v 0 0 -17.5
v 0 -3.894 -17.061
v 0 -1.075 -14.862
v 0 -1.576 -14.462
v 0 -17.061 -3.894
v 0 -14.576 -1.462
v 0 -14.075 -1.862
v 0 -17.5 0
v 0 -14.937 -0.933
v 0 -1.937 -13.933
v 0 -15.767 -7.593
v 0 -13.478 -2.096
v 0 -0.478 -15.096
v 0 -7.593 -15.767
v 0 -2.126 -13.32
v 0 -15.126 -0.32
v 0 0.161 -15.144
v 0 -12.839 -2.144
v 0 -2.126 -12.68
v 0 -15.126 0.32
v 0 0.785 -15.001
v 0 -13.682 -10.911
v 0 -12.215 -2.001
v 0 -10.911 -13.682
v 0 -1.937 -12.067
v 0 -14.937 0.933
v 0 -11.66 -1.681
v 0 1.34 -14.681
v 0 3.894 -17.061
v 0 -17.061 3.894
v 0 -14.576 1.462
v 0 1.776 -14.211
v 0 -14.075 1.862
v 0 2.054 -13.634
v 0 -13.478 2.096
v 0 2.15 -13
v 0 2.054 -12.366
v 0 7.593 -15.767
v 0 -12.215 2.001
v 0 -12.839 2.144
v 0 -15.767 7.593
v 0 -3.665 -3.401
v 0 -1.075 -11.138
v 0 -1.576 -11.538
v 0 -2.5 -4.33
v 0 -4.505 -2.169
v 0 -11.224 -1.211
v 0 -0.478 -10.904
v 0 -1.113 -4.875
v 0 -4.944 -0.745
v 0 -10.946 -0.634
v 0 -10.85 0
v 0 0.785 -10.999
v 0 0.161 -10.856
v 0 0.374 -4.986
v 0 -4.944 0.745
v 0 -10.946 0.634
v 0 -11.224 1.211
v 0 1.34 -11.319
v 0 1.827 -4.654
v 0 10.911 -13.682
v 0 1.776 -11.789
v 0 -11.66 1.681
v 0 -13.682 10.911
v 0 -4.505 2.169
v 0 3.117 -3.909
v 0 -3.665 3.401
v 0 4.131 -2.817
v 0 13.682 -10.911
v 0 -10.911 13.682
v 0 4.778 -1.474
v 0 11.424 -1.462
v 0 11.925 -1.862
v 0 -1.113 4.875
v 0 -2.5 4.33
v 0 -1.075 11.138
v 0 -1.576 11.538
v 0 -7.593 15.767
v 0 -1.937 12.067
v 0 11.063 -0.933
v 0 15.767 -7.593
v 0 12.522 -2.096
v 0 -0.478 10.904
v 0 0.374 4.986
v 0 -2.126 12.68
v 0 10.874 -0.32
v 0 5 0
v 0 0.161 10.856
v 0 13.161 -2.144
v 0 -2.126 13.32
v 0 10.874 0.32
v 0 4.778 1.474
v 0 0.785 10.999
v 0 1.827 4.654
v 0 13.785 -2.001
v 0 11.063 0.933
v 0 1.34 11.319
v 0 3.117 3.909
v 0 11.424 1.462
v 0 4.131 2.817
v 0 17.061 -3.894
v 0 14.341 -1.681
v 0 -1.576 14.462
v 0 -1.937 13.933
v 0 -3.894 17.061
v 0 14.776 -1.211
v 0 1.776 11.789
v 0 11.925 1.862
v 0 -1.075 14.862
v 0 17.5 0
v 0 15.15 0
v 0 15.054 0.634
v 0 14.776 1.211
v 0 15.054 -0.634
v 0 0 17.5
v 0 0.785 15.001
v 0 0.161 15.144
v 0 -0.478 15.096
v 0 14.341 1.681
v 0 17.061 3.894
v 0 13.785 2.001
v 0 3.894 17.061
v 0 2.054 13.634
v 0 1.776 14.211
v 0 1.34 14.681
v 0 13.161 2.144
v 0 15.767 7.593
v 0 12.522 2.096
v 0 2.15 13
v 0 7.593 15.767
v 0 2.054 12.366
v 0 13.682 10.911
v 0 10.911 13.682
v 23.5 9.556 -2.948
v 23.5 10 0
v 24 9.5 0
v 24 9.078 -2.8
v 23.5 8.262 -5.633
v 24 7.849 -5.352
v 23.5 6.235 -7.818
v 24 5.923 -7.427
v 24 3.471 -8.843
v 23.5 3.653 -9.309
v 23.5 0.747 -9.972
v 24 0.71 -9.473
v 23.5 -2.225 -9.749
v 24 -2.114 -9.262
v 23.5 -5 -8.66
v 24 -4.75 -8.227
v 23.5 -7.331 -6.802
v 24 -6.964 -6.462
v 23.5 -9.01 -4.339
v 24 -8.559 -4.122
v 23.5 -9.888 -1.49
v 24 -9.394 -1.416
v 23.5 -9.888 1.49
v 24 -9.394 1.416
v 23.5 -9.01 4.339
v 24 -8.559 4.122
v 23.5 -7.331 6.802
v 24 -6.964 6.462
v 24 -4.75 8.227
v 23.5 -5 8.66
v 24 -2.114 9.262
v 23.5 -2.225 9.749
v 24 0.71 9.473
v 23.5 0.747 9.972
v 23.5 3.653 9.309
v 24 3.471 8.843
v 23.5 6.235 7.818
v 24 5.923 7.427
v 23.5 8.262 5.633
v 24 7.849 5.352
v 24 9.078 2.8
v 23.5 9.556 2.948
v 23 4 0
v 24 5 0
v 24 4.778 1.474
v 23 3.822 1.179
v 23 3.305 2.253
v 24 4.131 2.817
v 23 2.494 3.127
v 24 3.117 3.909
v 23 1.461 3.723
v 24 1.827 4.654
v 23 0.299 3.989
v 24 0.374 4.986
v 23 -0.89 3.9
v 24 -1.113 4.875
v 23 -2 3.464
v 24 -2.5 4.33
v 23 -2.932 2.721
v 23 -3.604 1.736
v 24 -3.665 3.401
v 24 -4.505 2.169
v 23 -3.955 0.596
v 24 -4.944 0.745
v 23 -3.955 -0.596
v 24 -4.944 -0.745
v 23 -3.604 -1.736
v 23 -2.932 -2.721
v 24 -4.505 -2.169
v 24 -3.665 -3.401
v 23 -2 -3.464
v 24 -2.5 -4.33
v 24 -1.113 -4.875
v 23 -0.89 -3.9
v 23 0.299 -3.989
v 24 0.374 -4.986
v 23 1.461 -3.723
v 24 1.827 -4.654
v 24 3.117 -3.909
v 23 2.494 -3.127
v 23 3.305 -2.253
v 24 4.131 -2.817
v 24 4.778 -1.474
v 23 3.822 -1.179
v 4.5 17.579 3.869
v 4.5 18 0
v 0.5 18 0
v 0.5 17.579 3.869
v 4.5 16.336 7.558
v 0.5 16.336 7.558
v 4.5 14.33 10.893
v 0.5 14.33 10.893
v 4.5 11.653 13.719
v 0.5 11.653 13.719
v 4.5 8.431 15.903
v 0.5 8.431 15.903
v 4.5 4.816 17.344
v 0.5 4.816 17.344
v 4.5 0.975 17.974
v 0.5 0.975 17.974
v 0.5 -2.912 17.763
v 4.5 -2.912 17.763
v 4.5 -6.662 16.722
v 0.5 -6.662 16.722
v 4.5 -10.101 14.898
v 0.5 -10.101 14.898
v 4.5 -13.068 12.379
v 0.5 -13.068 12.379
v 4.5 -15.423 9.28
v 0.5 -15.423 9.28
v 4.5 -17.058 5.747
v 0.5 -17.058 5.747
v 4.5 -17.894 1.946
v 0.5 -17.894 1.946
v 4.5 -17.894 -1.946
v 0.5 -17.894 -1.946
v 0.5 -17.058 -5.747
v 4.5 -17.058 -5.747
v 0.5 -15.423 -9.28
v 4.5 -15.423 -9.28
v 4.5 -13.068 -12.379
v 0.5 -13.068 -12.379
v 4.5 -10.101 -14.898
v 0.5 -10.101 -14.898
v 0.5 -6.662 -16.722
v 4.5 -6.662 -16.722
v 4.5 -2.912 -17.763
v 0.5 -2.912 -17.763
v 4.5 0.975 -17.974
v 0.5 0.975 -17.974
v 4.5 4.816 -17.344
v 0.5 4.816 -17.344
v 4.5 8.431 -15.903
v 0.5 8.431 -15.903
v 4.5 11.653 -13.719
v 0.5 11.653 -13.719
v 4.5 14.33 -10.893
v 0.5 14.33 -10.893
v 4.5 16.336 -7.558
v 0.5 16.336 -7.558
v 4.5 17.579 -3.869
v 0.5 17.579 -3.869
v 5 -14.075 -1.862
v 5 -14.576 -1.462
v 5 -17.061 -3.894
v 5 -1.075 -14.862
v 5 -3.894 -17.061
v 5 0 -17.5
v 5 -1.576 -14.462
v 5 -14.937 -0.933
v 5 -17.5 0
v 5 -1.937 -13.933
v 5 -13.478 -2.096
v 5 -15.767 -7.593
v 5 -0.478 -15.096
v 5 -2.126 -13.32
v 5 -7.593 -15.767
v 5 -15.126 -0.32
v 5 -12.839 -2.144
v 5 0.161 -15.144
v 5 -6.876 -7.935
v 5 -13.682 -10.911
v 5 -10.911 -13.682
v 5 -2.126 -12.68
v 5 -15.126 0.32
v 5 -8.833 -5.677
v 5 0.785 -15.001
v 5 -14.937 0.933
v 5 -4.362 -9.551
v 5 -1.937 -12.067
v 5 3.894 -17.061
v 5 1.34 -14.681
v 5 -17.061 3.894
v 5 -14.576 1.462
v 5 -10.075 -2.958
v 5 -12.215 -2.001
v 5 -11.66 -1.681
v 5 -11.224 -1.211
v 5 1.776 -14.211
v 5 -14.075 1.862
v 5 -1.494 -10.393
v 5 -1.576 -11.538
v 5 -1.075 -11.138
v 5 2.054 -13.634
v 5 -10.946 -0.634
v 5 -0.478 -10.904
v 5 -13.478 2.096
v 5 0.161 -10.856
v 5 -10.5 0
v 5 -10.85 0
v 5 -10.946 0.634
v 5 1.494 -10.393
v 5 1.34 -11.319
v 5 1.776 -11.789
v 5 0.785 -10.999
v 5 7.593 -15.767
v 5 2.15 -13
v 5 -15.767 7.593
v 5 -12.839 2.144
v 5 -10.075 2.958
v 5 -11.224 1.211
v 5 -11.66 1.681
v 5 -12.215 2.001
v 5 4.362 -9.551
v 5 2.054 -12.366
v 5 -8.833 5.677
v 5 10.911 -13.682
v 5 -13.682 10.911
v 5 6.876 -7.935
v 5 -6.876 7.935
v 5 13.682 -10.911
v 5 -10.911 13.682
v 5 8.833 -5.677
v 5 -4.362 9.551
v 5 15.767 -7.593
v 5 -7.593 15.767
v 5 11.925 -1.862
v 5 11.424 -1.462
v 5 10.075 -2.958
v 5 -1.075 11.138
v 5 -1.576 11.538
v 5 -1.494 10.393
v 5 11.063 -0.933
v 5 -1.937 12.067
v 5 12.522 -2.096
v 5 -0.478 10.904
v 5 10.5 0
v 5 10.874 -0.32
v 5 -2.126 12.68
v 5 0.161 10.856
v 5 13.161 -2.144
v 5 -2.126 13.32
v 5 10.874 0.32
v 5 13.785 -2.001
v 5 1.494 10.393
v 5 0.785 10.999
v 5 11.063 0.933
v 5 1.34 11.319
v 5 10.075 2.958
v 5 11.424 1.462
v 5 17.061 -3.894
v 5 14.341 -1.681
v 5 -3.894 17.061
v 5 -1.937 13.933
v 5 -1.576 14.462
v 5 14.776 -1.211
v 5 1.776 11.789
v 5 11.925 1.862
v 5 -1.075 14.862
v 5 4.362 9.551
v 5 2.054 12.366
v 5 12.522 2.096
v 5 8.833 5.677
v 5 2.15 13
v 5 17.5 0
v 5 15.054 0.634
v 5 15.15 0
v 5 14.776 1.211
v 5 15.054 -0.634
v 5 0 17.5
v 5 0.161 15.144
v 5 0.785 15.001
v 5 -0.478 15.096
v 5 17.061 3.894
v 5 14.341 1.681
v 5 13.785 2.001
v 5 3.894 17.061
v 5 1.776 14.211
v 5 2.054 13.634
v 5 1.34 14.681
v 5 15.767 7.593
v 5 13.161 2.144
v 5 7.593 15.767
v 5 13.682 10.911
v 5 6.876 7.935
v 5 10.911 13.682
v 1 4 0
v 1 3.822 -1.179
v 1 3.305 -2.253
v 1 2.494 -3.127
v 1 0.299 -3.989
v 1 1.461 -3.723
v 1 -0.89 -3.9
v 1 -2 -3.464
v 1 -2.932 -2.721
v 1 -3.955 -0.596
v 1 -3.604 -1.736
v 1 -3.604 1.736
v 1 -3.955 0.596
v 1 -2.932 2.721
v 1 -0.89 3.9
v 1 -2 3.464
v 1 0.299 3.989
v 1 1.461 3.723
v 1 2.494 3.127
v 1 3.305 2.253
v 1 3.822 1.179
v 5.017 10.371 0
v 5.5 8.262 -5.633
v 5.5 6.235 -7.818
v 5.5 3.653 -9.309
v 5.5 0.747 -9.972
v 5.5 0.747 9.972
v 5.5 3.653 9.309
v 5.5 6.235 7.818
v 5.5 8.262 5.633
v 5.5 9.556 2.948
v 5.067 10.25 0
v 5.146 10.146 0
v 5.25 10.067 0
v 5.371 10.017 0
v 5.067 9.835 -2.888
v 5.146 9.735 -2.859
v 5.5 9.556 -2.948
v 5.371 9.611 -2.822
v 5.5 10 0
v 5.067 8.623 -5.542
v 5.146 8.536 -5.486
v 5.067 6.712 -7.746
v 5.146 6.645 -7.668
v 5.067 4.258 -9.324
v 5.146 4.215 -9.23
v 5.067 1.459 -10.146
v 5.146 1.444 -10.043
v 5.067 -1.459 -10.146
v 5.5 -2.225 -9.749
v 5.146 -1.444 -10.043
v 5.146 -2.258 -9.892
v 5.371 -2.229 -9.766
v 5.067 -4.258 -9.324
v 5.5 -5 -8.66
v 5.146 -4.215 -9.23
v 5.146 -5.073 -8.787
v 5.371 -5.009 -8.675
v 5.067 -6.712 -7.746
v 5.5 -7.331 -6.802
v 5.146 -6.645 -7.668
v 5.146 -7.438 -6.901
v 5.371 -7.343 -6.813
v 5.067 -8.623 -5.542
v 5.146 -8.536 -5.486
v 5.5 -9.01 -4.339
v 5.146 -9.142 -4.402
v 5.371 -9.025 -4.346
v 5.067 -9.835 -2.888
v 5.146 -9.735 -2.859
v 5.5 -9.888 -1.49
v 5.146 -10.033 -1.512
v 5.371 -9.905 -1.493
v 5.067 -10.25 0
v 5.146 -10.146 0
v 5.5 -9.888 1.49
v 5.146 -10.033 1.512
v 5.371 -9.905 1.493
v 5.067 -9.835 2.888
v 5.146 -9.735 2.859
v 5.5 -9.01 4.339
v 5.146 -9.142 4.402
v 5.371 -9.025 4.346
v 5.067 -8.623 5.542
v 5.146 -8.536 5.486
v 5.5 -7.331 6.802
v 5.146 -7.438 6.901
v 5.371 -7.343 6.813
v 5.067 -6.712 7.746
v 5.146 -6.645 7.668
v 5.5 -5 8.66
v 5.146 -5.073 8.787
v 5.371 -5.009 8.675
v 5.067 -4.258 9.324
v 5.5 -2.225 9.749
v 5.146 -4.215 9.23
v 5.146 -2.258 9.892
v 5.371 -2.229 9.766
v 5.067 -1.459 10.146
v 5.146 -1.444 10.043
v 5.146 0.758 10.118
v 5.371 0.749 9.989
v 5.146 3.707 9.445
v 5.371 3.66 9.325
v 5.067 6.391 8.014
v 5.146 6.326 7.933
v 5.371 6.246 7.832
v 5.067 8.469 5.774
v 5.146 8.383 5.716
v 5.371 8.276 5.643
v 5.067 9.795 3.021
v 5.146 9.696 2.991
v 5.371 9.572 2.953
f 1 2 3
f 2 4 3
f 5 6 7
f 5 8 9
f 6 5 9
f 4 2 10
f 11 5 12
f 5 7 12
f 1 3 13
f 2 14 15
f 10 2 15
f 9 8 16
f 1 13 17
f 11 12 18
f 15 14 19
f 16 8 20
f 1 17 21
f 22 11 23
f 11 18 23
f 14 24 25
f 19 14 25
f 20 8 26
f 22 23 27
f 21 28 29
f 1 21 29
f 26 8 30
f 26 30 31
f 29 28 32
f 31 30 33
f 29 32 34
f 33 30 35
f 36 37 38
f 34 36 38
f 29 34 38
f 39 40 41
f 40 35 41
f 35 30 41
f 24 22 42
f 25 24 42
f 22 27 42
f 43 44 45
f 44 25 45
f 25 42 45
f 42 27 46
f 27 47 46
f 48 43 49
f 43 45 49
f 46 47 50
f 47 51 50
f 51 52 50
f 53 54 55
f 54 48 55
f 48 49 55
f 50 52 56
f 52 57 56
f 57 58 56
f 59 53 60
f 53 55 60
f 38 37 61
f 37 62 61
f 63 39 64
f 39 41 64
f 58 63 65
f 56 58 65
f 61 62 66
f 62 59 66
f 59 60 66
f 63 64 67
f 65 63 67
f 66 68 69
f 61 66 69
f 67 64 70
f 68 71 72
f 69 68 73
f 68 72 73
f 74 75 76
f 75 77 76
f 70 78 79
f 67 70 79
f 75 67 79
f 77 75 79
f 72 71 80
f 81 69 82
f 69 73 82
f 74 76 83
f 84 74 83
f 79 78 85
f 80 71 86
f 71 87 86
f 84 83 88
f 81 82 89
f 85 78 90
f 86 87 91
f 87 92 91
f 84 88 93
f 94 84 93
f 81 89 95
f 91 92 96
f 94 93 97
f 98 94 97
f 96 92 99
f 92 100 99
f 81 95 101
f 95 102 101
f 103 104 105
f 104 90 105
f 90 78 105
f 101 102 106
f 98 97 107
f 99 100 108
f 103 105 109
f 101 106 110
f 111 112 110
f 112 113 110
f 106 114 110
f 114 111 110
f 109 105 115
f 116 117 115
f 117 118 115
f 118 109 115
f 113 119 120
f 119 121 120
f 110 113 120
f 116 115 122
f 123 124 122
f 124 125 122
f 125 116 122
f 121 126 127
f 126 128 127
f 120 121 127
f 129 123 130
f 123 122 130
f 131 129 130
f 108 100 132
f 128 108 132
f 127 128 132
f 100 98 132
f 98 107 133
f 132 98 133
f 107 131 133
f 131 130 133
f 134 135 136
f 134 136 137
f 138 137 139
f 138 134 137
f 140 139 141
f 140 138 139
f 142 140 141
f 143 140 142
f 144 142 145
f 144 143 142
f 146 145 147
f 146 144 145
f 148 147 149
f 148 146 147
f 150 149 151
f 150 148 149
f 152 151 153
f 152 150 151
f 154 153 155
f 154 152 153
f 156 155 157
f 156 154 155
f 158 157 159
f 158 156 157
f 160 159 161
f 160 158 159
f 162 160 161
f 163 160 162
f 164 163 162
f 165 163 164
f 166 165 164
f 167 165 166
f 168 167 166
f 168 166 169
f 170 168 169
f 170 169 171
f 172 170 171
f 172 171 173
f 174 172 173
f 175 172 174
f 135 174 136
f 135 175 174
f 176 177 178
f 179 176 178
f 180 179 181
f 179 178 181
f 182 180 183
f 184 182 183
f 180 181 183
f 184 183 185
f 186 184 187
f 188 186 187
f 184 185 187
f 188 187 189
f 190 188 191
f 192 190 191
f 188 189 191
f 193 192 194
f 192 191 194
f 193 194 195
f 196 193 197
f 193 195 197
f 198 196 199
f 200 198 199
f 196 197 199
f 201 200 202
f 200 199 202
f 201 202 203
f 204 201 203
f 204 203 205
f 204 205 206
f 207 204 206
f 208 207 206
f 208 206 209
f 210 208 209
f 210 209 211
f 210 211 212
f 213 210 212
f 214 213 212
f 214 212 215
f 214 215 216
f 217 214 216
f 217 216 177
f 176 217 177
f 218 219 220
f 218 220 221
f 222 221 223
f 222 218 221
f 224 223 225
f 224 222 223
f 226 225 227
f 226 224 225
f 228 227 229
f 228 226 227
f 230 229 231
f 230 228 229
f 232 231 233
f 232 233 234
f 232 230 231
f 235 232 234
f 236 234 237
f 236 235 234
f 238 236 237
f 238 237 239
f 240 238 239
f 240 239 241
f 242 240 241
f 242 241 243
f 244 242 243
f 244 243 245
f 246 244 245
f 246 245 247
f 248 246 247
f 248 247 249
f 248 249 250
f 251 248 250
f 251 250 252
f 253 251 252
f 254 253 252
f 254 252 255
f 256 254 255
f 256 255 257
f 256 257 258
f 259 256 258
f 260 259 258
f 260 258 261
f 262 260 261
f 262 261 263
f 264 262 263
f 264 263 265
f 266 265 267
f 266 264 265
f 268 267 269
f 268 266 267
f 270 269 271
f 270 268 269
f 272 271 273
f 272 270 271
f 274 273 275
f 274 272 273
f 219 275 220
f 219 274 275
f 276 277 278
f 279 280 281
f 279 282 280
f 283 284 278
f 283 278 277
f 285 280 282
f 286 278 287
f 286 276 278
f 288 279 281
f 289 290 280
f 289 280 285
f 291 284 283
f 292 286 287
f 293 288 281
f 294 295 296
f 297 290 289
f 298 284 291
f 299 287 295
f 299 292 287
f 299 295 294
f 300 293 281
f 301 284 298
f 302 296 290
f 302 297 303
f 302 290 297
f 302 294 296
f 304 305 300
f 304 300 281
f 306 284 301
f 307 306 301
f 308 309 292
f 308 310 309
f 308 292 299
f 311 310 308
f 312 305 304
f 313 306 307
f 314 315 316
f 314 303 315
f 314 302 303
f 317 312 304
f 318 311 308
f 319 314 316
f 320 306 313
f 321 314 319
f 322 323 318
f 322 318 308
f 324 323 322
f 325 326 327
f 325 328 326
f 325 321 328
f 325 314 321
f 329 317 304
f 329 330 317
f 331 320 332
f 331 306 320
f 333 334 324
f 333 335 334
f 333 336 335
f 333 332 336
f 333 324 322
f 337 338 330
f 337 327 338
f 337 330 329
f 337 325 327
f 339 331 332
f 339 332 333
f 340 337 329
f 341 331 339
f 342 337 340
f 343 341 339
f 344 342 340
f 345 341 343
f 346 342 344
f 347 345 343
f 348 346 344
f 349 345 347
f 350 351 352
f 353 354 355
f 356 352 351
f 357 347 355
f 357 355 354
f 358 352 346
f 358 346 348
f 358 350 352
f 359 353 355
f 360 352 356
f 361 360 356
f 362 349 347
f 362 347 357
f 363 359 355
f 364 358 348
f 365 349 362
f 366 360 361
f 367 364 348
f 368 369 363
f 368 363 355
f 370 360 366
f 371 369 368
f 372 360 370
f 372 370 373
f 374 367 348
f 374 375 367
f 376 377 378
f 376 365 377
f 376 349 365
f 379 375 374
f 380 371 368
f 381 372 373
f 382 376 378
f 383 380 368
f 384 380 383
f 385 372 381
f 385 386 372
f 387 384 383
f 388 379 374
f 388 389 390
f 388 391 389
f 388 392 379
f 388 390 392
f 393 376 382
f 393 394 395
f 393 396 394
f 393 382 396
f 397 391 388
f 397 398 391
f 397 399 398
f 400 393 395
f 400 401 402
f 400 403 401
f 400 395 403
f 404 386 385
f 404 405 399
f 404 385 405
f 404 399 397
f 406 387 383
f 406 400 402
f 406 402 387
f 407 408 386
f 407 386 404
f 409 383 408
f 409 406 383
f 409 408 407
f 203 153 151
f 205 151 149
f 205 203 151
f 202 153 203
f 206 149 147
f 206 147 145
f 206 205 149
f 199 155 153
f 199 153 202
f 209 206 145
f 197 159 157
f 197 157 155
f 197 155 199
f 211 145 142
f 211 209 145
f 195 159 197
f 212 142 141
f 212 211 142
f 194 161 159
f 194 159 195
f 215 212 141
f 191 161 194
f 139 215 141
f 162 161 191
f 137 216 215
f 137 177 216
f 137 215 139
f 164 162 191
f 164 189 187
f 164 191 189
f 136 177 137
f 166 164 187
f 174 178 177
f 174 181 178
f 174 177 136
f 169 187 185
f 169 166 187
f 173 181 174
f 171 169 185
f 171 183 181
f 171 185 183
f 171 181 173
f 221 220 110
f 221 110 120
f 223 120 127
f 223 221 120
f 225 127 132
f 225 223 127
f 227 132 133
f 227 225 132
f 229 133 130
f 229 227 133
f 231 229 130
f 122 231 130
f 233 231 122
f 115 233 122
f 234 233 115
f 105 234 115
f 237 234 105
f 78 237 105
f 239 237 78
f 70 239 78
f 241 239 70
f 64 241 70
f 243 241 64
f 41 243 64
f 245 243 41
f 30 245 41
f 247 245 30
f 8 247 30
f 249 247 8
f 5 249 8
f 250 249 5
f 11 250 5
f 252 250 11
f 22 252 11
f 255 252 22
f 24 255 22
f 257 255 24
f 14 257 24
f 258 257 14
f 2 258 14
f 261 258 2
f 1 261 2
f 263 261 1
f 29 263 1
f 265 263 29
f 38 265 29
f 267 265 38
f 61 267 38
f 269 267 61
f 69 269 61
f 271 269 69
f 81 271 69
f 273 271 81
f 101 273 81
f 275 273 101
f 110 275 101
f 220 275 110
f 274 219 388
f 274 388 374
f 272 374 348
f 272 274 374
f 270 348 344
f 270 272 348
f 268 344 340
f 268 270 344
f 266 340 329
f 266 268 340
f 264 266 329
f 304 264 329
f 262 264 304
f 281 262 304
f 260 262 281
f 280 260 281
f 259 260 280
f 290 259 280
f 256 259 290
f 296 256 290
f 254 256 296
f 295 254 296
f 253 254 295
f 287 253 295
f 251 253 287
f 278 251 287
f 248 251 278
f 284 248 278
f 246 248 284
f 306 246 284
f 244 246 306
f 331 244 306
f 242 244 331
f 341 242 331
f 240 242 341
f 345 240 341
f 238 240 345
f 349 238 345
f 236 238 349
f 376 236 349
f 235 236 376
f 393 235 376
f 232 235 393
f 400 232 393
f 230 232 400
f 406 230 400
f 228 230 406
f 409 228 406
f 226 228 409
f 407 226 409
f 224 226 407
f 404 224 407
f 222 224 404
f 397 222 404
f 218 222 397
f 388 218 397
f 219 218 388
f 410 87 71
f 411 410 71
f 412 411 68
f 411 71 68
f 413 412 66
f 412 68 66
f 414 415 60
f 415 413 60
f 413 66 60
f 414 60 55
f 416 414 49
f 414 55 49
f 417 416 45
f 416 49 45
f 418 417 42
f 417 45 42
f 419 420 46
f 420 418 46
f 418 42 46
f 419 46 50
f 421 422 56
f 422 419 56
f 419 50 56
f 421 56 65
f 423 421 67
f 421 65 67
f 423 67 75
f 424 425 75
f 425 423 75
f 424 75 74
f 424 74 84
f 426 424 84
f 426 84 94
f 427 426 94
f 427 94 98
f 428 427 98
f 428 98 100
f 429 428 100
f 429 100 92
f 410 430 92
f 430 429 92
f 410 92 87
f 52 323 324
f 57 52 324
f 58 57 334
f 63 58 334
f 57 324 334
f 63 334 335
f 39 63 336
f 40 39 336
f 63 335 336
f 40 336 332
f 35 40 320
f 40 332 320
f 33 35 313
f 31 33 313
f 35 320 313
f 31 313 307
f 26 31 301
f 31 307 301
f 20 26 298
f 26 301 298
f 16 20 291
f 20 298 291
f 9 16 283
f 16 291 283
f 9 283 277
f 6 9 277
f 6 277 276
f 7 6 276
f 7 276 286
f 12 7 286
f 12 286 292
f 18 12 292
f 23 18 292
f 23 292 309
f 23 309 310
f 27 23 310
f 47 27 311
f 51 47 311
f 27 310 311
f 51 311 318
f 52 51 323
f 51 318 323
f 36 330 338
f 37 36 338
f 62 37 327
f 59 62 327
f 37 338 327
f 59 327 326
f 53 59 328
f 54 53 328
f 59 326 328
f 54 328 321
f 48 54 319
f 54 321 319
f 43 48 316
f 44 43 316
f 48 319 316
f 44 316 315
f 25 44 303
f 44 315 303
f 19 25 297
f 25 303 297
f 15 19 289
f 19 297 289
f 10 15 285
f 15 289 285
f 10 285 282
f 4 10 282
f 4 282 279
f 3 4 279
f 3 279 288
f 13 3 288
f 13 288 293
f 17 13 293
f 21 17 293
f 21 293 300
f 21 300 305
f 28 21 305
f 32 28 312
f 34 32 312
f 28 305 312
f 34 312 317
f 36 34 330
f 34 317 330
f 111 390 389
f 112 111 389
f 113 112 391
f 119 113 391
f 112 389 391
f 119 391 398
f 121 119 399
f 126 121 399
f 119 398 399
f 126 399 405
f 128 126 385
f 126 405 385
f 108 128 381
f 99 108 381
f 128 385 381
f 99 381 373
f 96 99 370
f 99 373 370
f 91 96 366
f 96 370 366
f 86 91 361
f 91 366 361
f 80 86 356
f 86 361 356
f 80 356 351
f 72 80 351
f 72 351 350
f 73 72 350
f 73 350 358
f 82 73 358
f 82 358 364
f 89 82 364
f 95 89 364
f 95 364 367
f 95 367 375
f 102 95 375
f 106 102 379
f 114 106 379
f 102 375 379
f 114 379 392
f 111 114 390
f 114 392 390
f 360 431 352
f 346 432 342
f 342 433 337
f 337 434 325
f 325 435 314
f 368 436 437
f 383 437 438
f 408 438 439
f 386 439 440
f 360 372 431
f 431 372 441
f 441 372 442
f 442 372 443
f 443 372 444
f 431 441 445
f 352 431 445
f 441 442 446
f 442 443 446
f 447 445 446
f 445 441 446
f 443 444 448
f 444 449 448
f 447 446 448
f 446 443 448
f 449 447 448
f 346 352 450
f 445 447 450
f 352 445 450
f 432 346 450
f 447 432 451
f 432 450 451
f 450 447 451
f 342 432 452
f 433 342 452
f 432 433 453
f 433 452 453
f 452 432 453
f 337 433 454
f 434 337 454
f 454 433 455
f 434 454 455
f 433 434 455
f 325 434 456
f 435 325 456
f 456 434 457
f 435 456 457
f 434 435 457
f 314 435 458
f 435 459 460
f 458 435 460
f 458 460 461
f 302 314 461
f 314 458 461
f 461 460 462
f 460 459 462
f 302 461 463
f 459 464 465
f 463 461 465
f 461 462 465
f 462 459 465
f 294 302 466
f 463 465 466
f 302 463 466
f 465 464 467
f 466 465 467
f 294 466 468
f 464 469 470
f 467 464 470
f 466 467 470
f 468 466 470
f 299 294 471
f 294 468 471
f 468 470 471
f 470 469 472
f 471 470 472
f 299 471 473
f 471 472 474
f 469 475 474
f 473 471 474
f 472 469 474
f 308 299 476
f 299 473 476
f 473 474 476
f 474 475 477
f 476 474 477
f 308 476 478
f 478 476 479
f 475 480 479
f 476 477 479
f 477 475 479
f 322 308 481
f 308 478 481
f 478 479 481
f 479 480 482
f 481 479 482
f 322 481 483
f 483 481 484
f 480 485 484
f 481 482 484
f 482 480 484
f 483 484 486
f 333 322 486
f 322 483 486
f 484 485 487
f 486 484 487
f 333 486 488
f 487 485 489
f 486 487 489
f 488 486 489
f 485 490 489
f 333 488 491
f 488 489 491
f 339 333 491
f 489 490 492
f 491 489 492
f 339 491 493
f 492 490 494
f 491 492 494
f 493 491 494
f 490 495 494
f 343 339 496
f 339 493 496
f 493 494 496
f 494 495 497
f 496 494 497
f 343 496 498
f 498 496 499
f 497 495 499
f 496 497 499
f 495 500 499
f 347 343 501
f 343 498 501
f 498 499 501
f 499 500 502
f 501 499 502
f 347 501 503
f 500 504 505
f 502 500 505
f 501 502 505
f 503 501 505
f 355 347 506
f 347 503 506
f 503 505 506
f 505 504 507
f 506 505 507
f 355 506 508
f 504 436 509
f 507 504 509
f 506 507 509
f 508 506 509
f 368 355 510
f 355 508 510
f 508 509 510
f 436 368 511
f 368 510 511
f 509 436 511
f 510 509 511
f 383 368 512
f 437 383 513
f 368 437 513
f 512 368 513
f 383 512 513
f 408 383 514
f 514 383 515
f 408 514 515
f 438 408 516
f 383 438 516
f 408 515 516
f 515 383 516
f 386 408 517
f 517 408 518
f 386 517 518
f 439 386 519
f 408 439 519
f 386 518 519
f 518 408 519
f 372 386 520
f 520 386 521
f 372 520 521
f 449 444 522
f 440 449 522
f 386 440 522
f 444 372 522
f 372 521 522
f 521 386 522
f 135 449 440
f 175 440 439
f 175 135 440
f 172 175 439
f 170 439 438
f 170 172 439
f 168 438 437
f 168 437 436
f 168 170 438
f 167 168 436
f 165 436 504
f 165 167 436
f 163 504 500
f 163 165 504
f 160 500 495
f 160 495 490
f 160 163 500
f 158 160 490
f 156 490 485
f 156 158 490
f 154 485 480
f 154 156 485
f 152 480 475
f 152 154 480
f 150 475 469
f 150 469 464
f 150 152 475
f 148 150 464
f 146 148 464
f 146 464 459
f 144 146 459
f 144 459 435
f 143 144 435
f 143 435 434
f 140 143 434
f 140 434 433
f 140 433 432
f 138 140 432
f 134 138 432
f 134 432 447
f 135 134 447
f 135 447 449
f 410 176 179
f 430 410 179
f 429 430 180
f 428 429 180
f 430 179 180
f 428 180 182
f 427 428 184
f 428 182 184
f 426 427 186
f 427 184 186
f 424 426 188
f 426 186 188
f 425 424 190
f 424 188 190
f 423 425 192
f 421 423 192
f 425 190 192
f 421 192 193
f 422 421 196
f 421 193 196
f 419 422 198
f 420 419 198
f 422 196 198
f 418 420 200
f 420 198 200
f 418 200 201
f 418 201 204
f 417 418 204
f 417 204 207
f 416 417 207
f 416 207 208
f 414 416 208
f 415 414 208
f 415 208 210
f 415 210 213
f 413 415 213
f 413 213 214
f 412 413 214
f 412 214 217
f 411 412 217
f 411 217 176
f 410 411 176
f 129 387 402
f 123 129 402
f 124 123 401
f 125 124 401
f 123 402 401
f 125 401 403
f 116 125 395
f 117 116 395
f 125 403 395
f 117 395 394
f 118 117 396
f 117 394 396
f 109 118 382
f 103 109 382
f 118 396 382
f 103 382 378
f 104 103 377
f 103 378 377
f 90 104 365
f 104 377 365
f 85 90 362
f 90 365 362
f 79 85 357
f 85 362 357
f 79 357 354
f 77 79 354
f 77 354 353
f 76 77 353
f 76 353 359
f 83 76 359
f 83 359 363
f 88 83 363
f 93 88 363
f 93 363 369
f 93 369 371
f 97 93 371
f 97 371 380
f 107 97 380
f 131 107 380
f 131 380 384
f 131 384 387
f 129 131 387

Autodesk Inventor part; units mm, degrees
ref_plane "YZ Plane" through (0, 0, 0) normal (1, 0, 0) x (0, 1, 0)
ref_plane "XZ Plane" through (0, 0, 0) normal (0, 1, 0) x (-1, 0, 0)
ref_plane "XY Plane" through (0, 0, 0) normal (0, 0, 1) x (1, 0, 0)
sketch "Sketch_1" plane through (0, 0, 0) normal (0, 0, 1) x (1, 0, 0)
  line L0 (24, 0) -> (0, 0)
  line L1 (0, 0) -> (0, 17.5)
  line L2 (0, 17.5) -> (0.5, 18)
  line L3 (0.5, 18) -> (4.5, 18)
  line L4 (4.5, 18) -> (5, 17.5)
  line L5 (5, 17.5) -> (5, 10.5)
  arc A0 (5, 10.5) -> (5.5, 10) centre (5.5, 10.5) ccw
  line L6 (5.5, 10) -> (23.5, 10)
  line L7 (23.5, 10) -> (24, 9.5)
  line L8 (24, 9.5) -> (24, 0)
  line L9 (24, 0) -> (0, 0)
revolve "Revolution1" add sketch "Sketch_1" angle 360 about axis through (24, 0, 0) along (1, 0, 0)
sketch "Sketch_2" plane through (0, 0, 0) normal (0, 0, 1) x (1, 0, 0)
  line L0 (24, 0) -> (0, 0)
  line L1 (0, 0) -> (0, 5)
  line L2 (0, 5) -> (1, 4)
  line L3 (1, 4) -> (23, 4)
  line L4 (23, 4) -> (24, 5)
  line L5 (24, 5) -> (24, 0)
  line L6 (24, 0) -> (0, 0)
revolve "Revolution2" cut sketch "Sketch_2" angle 360 about axis through (24, 0, 0) along (1, 0, 0)
thread "Thread1" size "TR10x2" class "7H" standard "ISO Metric Trapezoidal Threads" full length
sketch "Sketch_3" plane through (0, 0, 0) normal (0, 0, 1) x (1, 0, 0)
  line L0 (5, 13) -> (0, 13)
  line L1 (0, 13) -> (0, 15.15)
  line L2 (0, 15.15) -> (5, 15.15)
  line L3 (5, 15.15) -> (5, 13)
  line L4 (5, 13) -> (0, 13)
revolve "Revolution3" cut sketch "Sketch_3" angle 360 about axis through (5, 13, 0) along (1, 0, 0)
pattern_linear "Rectangular Pattern1" count 2 spacing 18.3848 along (0, -0.7071, 0.7071) count 2 spacing 18.3848 along (0, -0.7071, -0.7071) of "Revolution3"
properties part number "MTSRR10"
